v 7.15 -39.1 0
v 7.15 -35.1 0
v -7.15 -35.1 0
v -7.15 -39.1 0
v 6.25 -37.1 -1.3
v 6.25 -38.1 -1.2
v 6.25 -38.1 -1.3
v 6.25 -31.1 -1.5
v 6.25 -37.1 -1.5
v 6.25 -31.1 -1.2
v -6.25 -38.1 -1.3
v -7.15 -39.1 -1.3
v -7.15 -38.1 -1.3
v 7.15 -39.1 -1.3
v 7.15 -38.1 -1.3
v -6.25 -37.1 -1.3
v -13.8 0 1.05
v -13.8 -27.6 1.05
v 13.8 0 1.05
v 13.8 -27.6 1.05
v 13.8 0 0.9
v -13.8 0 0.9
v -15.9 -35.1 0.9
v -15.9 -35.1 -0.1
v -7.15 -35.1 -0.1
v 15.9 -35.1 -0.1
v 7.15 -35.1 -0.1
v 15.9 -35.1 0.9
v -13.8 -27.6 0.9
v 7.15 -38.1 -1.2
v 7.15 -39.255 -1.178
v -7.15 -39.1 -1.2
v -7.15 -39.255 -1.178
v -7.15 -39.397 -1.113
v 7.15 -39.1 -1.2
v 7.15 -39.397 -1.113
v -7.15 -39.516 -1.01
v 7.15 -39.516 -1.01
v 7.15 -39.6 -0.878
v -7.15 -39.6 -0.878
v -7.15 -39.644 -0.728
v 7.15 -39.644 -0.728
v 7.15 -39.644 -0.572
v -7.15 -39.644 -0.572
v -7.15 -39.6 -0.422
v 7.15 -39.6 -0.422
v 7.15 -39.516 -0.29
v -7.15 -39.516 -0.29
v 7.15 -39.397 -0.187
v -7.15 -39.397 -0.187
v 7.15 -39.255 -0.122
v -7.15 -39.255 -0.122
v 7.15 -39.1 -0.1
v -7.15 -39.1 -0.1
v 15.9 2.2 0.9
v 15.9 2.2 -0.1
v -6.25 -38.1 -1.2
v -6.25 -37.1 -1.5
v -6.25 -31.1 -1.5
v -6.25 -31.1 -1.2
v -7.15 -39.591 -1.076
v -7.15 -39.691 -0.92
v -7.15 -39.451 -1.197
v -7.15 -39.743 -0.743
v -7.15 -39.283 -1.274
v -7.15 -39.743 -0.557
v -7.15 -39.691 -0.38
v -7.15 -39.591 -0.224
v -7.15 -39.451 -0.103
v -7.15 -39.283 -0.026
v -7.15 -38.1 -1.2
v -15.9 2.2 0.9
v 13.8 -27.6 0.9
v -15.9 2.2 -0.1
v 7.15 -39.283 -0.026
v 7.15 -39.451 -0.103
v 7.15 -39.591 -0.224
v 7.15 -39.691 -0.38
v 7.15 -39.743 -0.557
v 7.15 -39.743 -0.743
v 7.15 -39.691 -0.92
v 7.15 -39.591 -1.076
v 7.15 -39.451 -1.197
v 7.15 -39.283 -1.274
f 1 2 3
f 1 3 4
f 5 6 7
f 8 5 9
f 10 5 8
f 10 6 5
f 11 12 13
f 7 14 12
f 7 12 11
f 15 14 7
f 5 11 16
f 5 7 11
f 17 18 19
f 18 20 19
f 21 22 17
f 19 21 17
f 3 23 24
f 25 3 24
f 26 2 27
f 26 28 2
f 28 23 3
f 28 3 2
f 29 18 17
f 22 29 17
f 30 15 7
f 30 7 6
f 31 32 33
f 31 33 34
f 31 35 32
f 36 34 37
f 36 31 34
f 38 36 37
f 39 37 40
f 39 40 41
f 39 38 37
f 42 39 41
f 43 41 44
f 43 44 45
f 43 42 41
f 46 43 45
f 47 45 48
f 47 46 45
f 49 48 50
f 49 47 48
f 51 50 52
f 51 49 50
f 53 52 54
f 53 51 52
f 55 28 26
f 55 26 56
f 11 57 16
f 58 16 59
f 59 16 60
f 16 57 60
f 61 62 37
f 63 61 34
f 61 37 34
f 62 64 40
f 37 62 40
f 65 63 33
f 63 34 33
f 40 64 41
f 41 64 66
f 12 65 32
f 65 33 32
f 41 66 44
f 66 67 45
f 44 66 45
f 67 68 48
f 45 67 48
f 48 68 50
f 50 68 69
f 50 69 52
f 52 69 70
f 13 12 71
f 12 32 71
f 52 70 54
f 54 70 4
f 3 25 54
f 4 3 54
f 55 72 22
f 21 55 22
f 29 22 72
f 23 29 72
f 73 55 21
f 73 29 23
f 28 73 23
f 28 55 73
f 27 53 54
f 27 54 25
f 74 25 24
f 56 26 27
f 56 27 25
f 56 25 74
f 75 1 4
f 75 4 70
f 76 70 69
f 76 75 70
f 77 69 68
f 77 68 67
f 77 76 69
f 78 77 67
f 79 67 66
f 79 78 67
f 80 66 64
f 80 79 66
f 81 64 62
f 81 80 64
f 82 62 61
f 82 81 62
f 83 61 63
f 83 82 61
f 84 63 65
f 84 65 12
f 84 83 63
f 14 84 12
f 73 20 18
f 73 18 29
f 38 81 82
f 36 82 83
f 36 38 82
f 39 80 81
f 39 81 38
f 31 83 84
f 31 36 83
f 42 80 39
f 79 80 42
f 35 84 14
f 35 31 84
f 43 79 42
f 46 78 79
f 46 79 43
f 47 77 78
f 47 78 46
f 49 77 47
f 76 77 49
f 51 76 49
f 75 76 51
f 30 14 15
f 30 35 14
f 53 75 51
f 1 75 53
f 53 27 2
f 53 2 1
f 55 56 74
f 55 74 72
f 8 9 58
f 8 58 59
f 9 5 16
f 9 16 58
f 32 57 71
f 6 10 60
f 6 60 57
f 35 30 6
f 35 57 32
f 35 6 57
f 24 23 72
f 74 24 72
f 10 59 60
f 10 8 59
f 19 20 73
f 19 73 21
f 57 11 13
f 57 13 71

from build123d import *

# Parameters (mm, degrees)
F0_W     = 27.6
F0_H     = 0.15
F0_H_2   = 0.9
F1_DEPTH = 13.8
F2_DEPTH = 15.9
F3_DEPTH = 7.15
F4_DEPTH = 6.25


with BuildPart() as f1:
    # F0 (on Right) → F1 (new body, symmetric)
    with BuildSketch(Plane.YZ):
        with Locations((-13.8, 0.975)):
            Rectangle(F0_W, F0_H)
        with Locations((-13.8, 0.45)):
            Rectangle(F0_W, F0_H_2)
    extrude(amount=F1_DEPTH, both=True)

    # F0 (on Right) → F2 (join, symmetric)
    with BuildSketch(Plane.YZ):
        Polygon((-35.1, 0.9), (-35.1, 0), (-35.1, -0.1), (2.2, -0.1), (2.2, 0.9), (0, 0.9), (0, 0), (-27.6, 0), (-27.6, 0.9), align=None)
        with Locations((-13.8, 0.45)):
            Rectangle(F0_W, F0_H_2)
    extrude(amount=F2_DEPTH, both=True)

    # F0 (on Right) → F3 (join, symmetric)
    with BuildSketch(Plane.YZ):
        with BuildLine():
            Line((-35.1, -0.1), (-35.1, 0))
            Line((-35.1, 0), (-39.1, 0))
            ThreePointArc((-39.1, 0), (-39.75, -0.65), (-39.1, -1.3))
            Line((-39.1, -1.3), (-38.1, -1.3))
            Line((-38.1, -1.3), (-38.1, -1.2))
            Line((-38.1, -1.2), (-39.1, -1.2))
            ThreePointArc((-39.1, -1.2), (-39.65, -0.65), (-39.1, -0.1))
            Line((-39.1, -0.1), (-35.1, -0.1))
        make_face()
    extrude(amount=F3_DEPTH, both=True)

    # F0 (on Right) → F4 (join, symmetric)
    with BuildSketch(Plane.YZ):
        Polygon((-38.1, -1.2), (-38.1, -1.3), (-37.1, -1.3), (-37.1, -1.5), (-31.1, -1.5), (-31.1, -1.3), (-31.1, -1.2), align=None)
    extrude(amount=F4_DEPTH, both=True)


solid = f1.part
